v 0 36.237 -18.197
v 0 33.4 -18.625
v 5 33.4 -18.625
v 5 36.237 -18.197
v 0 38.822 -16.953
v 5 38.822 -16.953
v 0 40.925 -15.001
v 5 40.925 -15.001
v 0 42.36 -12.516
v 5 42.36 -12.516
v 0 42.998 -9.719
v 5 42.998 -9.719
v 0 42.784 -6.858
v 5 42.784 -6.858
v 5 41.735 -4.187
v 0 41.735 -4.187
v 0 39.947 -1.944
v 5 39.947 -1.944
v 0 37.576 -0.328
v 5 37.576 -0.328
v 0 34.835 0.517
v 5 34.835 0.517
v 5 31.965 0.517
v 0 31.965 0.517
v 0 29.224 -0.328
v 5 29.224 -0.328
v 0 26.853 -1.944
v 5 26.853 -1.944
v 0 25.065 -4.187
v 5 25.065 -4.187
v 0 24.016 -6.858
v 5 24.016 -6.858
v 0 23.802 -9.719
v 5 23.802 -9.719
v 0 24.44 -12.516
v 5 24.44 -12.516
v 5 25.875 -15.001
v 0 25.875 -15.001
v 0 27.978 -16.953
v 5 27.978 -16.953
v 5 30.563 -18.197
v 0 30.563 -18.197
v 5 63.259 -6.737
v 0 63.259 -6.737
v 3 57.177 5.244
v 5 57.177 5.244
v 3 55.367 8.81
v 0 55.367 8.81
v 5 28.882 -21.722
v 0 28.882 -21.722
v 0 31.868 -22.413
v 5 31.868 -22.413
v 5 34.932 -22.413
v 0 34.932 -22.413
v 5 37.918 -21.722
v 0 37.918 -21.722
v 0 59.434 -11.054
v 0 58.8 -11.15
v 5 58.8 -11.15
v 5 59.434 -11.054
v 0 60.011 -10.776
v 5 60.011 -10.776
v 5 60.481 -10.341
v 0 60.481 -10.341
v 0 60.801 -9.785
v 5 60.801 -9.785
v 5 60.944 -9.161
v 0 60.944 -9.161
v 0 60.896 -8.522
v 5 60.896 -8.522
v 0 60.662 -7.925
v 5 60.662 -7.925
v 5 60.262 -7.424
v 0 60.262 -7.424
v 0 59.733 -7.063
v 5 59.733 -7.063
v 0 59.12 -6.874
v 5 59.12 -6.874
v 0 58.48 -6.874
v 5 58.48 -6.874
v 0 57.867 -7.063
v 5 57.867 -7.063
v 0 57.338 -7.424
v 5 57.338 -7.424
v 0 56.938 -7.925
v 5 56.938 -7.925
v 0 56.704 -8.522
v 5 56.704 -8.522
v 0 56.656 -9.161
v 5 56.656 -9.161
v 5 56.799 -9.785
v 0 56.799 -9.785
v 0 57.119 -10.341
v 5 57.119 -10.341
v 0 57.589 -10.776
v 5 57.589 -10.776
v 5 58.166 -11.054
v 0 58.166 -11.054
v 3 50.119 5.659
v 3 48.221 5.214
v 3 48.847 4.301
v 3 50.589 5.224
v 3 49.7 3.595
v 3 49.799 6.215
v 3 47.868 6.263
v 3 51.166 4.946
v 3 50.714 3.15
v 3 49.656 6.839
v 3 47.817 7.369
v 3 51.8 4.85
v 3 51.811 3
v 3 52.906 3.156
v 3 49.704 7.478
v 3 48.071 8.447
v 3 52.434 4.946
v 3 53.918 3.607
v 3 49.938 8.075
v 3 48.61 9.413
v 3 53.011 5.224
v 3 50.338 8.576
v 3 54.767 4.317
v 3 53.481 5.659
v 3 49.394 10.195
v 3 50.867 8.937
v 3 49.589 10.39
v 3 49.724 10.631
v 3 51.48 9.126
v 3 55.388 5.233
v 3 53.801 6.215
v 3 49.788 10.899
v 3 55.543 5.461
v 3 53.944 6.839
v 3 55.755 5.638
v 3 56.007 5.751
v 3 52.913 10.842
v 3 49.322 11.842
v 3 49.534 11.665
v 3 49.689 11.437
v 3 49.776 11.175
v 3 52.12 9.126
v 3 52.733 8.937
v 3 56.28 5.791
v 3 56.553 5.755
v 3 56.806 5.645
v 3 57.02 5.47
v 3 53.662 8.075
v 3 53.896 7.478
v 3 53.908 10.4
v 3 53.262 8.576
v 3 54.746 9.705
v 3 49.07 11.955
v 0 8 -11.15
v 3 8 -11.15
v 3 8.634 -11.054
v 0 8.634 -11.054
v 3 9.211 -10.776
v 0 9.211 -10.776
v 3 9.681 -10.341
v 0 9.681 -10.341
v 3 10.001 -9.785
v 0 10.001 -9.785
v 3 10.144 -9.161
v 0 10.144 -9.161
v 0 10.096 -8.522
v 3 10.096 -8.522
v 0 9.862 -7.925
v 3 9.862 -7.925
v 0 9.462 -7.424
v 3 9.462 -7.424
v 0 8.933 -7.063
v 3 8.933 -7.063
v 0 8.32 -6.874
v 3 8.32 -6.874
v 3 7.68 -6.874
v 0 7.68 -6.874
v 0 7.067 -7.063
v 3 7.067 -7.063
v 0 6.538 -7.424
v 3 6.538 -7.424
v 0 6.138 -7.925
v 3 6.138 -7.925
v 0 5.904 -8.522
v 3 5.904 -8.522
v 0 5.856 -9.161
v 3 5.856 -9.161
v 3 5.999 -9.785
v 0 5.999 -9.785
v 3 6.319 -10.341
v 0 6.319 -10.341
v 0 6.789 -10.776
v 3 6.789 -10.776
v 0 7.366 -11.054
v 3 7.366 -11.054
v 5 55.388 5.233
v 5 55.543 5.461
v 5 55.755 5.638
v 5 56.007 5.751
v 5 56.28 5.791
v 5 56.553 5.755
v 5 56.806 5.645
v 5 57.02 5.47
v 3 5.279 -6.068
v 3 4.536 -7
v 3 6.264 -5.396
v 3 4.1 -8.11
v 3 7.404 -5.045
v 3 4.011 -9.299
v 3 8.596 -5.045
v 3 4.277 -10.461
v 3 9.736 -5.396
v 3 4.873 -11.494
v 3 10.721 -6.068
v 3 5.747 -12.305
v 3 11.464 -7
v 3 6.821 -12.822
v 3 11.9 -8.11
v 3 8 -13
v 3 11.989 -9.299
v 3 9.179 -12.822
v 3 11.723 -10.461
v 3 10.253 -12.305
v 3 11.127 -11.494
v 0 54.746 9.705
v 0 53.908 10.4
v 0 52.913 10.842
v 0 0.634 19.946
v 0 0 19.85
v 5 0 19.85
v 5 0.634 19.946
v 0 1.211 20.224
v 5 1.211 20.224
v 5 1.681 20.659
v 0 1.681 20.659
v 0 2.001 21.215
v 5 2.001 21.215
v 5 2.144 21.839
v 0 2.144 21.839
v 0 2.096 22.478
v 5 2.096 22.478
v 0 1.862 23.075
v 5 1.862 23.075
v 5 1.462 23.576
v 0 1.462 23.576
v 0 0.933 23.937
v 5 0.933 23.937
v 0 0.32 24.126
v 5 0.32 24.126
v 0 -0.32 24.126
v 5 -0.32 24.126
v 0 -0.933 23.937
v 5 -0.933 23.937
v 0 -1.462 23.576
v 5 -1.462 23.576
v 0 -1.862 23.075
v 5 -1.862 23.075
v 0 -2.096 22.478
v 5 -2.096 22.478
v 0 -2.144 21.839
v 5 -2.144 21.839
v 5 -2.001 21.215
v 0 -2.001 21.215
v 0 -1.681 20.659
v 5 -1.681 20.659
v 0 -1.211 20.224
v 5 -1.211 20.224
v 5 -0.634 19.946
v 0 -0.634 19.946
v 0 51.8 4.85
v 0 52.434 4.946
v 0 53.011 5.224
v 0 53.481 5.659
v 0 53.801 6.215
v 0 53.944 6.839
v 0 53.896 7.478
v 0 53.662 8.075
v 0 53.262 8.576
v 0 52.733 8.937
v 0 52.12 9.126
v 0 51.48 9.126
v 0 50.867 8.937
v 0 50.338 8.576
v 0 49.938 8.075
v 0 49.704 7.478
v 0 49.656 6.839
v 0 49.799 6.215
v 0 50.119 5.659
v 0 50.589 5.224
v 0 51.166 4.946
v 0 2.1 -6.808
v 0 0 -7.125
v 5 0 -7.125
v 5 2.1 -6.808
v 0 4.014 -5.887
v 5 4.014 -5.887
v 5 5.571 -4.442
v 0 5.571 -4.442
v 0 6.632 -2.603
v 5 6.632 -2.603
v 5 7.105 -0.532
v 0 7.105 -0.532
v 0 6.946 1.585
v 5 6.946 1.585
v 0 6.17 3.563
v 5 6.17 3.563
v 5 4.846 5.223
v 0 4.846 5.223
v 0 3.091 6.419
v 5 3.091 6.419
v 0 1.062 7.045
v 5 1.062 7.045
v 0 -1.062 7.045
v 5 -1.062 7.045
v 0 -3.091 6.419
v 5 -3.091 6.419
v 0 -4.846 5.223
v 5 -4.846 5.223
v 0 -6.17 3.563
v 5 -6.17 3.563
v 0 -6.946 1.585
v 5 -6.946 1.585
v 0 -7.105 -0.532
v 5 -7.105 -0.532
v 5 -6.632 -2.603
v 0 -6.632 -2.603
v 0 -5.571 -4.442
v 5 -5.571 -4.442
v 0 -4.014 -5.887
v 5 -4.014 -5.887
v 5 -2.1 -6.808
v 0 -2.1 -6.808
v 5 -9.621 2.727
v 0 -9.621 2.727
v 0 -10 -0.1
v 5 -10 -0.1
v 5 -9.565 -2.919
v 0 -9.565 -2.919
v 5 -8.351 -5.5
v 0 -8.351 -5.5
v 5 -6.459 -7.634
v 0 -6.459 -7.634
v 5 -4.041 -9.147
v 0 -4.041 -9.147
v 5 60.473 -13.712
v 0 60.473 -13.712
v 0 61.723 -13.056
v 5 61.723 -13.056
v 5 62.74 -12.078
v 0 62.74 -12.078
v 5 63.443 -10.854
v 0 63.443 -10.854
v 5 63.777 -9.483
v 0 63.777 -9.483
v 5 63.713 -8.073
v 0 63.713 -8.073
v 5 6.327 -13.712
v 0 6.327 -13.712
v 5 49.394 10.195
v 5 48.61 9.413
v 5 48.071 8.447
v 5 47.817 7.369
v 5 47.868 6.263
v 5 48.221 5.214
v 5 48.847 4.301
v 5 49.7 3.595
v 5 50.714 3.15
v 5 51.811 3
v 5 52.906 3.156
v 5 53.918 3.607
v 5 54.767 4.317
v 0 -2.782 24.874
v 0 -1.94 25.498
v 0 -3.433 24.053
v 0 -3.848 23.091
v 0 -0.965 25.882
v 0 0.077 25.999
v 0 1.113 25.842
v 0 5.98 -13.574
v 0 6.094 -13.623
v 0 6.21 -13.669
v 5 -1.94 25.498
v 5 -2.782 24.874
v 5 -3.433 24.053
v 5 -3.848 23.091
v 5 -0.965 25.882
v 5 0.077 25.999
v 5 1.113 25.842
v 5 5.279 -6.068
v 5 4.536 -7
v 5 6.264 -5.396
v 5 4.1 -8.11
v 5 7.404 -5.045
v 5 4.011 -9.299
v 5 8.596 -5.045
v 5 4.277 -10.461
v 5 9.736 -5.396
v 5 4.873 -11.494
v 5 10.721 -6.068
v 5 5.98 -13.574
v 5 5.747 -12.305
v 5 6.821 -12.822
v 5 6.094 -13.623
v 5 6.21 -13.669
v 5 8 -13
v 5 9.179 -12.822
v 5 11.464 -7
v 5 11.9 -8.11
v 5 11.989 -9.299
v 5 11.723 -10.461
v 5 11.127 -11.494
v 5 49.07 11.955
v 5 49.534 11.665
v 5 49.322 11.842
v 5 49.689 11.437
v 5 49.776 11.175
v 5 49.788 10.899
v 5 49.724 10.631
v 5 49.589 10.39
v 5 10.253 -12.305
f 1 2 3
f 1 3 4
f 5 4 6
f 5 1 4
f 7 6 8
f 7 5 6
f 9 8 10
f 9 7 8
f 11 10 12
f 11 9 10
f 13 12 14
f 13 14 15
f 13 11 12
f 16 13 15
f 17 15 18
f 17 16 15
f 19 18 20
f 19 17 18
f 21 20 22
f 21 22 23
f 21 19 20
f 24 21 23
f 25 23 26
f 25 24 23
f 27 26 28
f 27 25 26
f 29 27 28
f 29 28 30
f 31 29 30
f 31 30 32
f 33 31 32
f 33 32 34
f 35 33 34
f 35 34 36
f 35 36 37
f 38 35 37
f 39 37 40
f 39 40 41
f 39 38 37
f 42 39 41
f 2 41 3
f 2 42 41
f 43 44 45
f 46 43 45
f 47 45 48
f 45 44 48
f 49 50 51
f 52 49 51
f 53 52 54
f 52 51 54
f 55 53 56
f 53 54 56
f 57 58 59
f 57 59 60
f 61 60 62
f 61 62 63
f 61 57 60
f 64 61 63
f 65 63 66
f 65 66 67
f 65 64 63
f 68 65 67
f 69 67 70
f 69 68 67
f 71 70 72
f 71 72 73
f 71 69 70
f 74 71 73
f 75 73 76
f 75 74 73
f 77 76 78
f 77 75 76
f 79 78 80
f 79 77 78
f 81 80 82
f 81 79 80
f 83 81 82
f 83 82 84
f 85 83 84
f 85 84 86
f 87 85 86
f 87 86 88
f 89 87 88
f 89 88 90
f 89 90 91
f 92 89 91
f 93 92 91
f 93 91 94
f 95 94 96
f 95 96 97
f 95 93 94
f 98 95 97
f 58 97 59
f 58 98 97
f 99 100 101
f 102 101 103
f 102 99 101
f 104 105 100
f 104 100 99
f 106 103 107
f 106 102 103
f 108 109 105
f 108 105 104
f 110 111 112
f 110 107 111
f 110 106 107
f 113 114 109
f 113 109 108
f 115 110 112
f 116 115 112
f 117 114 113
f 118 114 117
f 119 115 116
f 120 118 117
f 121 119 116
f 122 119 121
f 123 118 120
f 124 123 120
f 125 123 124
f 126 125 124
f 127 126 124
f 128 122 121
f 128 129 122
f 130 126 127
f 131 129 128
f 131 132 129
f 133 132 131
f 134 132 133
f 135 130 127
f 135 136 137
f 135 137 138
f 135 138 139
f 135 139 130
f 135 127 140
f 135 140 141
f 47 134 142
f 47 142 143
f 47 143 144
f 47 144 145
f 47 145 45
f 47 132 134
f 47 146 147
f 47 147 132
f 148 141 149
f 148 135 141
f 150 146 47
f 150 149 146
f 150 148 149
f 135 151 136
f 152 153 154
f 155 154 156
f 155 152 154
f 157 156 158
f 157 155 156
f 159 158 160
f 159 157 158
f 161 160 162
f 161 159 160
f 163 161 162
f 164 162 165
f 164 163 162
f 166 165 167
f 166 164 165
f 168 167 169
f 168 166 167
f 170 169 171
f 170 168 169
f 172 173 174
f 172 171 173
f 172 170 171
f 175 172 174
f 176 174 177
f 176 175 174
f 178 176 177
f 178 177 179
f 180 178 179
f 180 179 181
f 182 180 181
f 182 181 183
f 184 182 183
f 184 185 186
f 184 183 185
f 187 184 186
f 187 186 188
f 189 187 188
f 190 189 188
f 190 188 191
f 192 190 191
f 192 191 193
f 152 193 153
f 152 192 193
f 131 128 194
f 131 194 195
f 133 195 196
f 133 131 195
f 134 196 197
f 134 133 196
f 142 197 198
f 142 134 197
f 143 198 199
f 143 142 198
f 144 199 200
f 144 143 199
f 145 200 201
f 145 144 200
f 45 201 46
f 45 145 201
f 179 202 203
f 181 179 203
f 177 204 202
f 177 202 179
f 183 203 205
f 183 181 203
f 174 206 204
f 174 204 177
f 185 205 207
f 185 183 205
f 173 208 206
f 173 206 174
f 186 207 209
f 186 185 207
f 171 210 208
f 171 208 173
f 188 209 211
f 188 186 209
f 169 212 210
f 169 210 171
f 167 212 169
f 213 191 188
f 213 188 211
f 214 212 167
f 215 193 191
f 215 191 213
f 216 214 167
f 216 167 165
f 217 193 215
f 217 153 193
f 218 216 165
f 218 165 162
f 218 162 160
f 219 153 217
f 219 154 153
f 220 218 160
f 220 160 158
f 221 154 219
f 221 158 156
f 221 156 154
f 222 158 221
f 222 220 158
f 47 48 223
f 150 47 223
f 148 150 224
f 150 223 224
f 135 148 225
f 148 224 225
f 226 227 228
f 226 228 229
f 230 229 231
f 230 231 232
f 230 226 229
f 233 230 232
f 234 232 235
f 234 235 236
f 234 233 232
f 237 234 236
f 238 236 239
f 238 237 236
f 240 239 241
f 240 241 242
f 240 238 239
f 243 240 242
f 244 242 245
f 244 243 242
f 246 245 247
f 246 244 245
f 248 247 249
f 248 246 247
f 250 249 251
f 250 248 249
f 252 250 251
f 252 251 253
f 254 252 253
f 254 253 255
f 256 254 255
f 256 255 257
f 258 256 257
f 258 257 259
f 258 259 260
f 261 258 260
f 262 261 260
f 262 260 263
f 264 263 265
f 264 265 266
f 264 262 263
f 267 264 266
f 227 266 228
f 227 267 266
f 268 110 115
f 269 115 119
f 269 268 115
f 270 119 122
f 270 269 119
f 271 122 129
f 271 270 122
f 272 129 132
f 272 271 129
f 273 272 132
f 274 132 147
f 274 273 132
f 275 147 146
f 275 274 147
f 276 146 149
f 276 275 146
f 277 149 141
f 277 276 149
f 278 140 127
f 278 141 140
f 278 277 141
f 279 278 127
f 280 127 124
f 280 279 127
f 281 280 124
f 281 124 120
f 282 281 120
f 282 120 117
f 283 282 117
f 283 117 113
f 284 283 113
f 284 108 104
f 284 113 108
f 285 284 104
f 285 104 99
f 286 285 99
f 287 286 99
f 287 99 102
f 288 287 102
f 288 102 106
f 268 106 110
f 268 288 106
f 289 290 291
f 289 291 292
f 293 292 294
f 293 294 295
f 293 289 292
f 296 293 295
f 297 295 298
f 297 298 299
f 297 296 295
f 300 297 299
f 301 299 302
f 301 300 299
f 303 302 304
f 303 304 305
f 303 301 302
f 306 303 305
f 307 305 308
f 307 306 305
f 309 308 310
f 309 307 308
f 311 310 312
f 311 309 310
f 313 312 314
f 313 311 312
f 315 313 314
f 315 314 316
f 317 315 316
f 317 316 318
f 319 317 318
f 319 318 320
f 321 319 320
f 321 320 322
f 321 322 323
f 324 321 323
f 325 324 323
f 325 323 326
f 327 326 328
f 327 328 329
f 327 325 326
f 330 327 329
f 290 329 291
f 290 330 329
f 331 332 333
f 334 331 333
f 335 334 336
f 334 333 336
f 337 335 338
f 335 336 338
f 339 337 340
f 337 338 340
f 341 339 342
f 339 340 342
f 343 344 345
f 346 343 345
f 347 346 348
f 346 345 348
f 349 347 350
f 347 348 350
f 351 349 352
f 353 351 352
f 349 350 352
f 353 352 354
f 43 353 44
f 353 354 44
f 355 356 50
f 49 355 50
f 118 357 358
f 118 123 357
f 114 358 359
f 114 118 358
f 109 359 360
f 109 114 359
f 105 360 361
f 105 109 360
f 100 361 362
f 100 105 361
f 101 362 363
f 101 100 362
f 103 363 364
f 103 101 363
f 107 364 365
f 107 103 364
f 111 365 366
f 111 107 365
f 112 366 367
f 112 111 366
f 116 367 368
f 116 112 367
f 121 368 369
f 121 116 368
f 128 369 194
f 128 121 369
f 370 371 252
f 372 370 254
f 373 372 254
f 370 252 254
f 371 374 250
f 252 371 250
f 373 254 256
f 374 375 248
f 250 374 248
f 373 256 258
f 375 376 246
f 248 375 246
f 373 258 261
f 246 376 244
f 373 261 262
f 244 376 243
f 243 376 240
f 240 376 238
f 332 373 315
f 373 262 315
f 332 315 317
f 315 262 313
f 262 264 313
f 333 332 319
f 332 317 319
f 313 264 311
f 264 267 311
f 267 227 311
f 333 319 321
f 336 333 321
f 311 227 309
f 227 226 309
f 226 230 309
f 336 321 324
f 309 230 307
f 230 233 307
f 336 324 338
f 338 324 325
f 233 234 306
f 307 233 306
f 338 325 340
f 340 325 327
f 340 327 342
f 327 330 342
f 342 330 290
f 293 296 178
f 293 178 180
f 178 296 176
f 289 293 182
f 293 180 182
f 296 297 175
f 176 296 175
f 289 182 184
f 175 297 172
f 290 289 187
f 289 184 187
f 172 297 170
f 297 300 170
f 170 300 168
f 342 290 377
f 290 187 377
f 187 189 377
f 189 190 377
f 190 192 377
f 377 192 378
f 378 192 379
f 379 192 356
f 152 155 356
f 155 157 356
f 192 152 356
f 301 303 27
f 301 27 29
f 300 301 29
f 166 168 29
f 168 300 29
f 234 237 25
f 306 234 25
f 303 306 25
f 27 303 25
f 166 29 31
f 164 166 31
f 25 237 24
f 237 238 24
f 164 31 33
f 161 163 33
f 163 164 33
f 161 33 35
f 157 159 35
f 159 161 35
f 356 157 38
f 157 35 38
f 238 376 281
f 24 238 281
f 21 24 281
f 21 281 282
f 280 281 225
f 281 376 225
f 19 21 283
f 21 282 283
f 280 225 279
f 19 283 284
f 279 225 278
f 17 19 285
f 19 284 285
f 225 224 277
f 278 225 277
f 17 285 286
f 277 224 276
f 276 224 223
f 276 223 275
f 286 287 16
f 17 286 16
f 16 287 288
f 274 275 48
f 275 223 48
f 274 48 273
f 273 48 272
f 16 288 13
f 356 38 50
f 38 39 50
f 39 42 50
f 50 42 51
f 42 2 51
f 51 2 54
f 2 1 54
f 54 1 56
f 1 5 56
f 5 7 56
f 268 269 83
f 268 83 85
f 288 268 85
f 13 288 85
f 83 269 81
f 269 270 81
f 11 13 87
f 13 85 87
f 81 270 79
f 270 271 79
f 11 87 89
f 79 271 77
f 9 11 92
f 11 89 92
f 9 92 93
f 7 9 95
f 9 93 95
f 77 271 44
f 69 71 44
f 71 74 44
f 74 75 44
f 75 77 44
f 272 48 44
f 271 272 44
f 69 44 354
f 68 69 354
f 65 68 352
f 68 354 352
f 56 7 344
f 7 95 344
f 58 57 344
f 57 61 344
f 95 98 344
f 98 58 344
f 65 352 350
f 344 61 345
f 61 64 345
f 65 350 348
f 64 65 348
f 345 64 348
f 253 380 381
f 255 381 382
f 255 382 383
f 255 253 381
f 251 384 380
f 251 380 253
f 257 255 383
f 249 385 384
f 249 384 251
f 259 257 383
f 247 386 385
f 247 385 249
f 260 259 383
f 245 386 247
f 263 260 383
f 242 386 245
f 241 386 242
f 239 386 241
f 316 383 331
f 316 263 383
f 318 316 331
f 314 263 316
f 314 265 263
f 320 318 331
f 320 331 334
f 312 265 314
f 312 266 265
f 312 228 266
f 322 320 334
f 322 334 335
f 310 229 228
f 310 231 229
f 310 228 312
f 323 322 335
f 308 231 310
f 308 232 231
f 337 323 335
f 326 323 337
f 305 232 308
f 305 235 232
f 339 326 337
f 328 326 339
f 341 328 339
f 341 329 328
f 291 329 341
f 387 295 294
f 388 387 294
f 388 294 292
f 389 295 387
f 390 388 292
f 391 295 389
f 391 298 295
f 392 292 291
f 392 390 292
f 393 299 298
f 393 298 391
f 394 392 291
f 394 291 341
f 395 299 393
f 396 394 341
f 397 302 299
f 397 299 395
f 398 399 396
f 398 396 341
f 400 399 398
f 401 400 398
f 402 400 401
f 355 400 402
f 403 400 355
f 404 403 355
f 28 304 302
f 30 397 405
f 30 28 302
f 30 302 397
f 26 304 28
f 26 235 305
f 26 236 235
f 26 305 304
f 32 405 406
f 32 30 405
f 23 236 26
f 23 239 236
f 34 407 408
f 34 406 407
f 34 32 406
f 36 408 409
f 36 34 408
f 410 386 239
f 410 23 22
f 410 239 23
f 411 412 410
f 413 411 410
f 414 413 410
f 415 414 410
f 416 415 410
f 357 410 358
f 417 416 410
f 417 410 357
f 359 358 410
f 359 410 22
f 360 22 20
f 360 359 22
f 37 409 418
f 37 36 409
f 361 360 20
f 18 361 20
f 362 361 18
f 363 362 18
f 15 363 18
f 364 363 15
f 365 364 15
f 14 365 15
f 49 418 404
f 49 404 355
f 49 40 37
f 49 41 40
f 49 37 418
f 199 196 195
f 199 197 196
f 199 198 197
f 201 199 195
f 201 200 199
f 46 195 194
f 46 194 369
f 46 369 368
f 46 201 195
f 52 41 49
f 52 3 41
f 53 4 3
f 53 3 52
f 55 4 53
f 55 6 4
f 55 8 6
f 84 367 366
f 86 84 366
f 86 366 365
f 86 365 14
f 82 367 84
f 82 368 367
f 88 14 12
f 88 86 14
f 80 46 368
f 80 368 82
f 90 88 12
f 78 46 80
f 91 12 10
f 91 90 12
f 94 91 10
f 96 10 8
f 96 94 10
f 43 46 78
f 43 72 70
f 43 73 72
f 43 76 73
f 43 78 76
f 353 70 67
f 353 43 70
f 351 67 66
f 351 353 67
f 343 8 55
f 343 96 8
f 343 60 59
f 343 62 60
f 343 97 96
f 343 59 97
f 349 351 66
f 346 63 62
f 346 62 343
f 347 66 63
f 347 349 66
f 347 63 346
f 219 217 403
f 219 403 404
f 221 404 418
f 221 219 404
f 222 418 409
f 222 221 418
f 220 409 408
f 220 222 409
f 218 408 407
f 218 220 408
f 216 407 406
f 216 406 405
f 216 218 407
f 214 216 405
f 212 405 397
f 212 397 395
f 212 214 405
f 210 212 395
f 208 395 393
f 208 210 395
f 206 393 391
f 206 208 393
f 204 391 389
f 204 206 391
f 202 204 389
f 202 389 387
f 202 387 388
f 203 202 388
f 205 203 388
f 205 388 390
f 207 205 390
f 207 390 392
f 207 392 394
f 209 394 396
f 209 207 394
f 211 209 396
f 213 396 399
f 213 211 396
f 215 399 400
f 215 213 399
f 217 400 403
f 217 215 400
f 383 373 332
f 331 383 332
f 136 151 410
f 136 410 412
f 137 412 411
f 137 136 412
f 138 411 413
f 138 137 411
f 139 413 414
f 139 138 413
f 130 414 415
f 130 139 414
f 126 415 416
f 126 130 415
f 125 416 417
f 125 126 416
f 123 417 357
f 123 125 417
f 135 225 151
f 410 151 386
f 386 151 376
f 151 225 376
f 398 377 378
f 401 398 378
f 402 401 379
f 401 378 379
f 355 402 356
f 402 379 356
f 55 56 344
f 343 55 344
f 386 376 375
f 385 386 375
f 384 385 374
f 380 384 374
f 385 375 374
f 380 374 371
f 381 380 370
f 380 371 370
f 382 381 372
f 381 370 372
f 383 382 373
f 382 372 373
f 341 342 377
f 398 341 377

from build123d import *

# Parameters (mm, degrees)
SKETCH_1_R          = 2.15
SKETCH_1_R_2        = 7.125
EXTRUDE_1_DEPTH     = 5
EXTRUDE_START       = -5
SKETCH_2_R          = 13.5
SKETCH_2_R_2        = 9.5
EXTRUDE_2_DEPTH     = 5
CUT_EXTRUDE_START   = -2
SKETCH_3_R          = 4
CUT_EXTRUDE_1_DEPTH = 2
FILLET_START        = 3
FILLET_1_DEPTH      = 3
MOVE_FACE1_BY       = 0.125


with BuildPart() as part:
    # 草图1 → 凸台-拉伸1 (new body)
    with BuildSketch(Plane(origin=(0, 0, 0), x_dir=(0, 0, -1), z_dir=(1, 0, 0))):
        with BuildLine():
            Line((-23.090909091, -3.848365543), (-2.727272727, -9.620913858))
            ThreePointArc((-2.727272727, -9.620913858), (4.253098654, -9.050477989), (9.147283393, -4.040693817))
            Line((9.147283393, -4.040693817), (13.573641697, 5.979653091))
            ThreePointArc((13.573641697, 5.979653091), (13.638118854, 9.867579581), (10.897437667, 12.625984252))
            Line((10.897437667, 12.625984252), (1.979480632, 16.283858268))
            ThreePointArc((1.979480632, 16.283858268), (-9.5, 33.4), (1.979480632, 50.516141732))
            Line((1.979480632, 50.516141732), (10.897437667, 54.174015748))
            ThreePointArc((10.897437667, 54.174015748), (13.545928712, 60.881953925), (6.736898846, 63.258516924))
            Line((6.736898846, 63.258516924), (-8.810480924, 55.366813539))
            ThreePointArc((-8.810480924, 55.366813539), (-10.081211961, 54.350712224), (-10.842152772, 52.912592502))
            Line((-10.842152772, 52.912592502), (-25.842152772, 1.112592502))
            ThreePointArc((-25.842152772, 1.112592502), (-25.498078189, -1.939961078), (-23.090909091, -3.848365543))
        make_face()
        with Locations((9, 58.8)):
            Circle(SKETCH_1_R, mode=Mode.SUBTRACT)
        with Locations((-22, 0)):
            Circle(SKETCH_1_R, mode=Mode.SUBTRACT)
        with Locations((-7, 51.8)):
            Circle(SKETCH_1_R, mode=Mode.SUBTRACT)
        with Locations((9, 8)):
            Circle(SKETCH_1_R, mode=Mode.SUBTRACT)
        Circle(SKETCH_1_R_2, mode=Mode.SUBTRACT)
    extrude(amount=EXTRUDE_1_DEPTH)

    # 草图2 → 凸台-拉伸2 (add)
    # profile 1 of 2: a face of its own
    with BuildSketch(Plane(origin=(5, 0, 0), x_dir=(0, 0, -1), z_dir=(1, 0, 0)).offset(EXTRUDE_START)):
        with BuildLine():
            Line((21.721644442, 37.917716535), (13.711720164, 60.473228346))
            ThreePointArc((13.711720164, 60.473228346), (13.565113542, 56.760456337), (10.897437667, 54.174015748))
            Line((10.897437667, 54.174015748), (1.979480632, 50.516141732))
            ThreePointArc((1.979480632, 50.516141732), (-9.5, 33.4), (1.979480632, 16.283858268))
            Line((1.979480632, 16.283858268), (10.897437667, 12.625984252))
            ThreePointArc((10.897437667, 12.625984252), (13.565113542, 10.039543663), (13.711720164, 6.326771654))
            Line((13.711720164, 6.326771654), (21.721644442, 28.882283465))
            ThreePointArc((21.721644442, 28.882283465), (-4.5, 33.4), (21.721644442, 37.917716535))
        make_face()
    # profile 2 of 2: a face of its own
    with BuildSketch(Plane(origin=(5, 0, 0), x_dir=(0, 0, -1), z_dir=(1, 0, 0)).offset(EXTRUDE_START)):
        with Locations((9, 33.4)):
            Circle(SKETCH_2_R)
        with Locations((9, 33.4)):
            Circle(SKETCH_2_R_2, mode=Mode.SUBTRACT)
    extrude(amount=EXTRUDE_2_DEPTH)

    # 草图3 → 切除-拉伸1 (cut)
    with BuildSketch(Plane(origin=(5, 0, 0), x_dir=(0, 0, -1), z_dir=(1, 0, 0)).offset(CUT_EXTRUDE_START)):
        with Locations((-7, 51.8)):
            Circle(SKETCH_3_R)
        with Locations((9, 8)):
            Circle(SKETCH_3_R)
    extrude(amount=CUT_EXTRUDE_1_DEPTH, mode=Mode.SUBTRACT)

    # 圆角1: read off the stored shape, not the designer's step
    # 圆角1 outline → 圆角1 (cut)
    with BuildSketch(Plane.YZ.offset(FILLET_START)):
        with BuildLine():
            ThreePointArc((49.070439729, 11.954745274), (49.775814705, 11.174989574), (49.393833283, 10.195365665))
            ThreePointArc((49.393833283, 10.195365665), (51.07687003, 10.934092404), (52.912592502, 10.842152772))
            Line((52.912592502, 10.842152772), (49.070439729, 11.954745274))
        make_face()
        with BuildLine():
            ThreePointArc((55.388472863, 5.232837723), (56.279537114, 5.791028828), (57.177294463, 5.243667384))
            Line((57.177294463, 5.243667384), (55.366813539, 8.810480924))
            ThreePointArc((55.366813539, 8.810480924), (55.799926698, 7.02421586), (55.388472863, 5.232837723))
        make_face()
    extrude(amount=FILLET_1_DEPTH, mode=Mode.SUBTRACT)

    # Move Face1: a curved face moved inward by 0.125
    add(Solid.thicken(part.faces().sort_by_distance((2.5, 33.4, 0.5))[0], -MOVE_FACE1_BY), mode=Mode.SUBTRACT)


solid = part.part
